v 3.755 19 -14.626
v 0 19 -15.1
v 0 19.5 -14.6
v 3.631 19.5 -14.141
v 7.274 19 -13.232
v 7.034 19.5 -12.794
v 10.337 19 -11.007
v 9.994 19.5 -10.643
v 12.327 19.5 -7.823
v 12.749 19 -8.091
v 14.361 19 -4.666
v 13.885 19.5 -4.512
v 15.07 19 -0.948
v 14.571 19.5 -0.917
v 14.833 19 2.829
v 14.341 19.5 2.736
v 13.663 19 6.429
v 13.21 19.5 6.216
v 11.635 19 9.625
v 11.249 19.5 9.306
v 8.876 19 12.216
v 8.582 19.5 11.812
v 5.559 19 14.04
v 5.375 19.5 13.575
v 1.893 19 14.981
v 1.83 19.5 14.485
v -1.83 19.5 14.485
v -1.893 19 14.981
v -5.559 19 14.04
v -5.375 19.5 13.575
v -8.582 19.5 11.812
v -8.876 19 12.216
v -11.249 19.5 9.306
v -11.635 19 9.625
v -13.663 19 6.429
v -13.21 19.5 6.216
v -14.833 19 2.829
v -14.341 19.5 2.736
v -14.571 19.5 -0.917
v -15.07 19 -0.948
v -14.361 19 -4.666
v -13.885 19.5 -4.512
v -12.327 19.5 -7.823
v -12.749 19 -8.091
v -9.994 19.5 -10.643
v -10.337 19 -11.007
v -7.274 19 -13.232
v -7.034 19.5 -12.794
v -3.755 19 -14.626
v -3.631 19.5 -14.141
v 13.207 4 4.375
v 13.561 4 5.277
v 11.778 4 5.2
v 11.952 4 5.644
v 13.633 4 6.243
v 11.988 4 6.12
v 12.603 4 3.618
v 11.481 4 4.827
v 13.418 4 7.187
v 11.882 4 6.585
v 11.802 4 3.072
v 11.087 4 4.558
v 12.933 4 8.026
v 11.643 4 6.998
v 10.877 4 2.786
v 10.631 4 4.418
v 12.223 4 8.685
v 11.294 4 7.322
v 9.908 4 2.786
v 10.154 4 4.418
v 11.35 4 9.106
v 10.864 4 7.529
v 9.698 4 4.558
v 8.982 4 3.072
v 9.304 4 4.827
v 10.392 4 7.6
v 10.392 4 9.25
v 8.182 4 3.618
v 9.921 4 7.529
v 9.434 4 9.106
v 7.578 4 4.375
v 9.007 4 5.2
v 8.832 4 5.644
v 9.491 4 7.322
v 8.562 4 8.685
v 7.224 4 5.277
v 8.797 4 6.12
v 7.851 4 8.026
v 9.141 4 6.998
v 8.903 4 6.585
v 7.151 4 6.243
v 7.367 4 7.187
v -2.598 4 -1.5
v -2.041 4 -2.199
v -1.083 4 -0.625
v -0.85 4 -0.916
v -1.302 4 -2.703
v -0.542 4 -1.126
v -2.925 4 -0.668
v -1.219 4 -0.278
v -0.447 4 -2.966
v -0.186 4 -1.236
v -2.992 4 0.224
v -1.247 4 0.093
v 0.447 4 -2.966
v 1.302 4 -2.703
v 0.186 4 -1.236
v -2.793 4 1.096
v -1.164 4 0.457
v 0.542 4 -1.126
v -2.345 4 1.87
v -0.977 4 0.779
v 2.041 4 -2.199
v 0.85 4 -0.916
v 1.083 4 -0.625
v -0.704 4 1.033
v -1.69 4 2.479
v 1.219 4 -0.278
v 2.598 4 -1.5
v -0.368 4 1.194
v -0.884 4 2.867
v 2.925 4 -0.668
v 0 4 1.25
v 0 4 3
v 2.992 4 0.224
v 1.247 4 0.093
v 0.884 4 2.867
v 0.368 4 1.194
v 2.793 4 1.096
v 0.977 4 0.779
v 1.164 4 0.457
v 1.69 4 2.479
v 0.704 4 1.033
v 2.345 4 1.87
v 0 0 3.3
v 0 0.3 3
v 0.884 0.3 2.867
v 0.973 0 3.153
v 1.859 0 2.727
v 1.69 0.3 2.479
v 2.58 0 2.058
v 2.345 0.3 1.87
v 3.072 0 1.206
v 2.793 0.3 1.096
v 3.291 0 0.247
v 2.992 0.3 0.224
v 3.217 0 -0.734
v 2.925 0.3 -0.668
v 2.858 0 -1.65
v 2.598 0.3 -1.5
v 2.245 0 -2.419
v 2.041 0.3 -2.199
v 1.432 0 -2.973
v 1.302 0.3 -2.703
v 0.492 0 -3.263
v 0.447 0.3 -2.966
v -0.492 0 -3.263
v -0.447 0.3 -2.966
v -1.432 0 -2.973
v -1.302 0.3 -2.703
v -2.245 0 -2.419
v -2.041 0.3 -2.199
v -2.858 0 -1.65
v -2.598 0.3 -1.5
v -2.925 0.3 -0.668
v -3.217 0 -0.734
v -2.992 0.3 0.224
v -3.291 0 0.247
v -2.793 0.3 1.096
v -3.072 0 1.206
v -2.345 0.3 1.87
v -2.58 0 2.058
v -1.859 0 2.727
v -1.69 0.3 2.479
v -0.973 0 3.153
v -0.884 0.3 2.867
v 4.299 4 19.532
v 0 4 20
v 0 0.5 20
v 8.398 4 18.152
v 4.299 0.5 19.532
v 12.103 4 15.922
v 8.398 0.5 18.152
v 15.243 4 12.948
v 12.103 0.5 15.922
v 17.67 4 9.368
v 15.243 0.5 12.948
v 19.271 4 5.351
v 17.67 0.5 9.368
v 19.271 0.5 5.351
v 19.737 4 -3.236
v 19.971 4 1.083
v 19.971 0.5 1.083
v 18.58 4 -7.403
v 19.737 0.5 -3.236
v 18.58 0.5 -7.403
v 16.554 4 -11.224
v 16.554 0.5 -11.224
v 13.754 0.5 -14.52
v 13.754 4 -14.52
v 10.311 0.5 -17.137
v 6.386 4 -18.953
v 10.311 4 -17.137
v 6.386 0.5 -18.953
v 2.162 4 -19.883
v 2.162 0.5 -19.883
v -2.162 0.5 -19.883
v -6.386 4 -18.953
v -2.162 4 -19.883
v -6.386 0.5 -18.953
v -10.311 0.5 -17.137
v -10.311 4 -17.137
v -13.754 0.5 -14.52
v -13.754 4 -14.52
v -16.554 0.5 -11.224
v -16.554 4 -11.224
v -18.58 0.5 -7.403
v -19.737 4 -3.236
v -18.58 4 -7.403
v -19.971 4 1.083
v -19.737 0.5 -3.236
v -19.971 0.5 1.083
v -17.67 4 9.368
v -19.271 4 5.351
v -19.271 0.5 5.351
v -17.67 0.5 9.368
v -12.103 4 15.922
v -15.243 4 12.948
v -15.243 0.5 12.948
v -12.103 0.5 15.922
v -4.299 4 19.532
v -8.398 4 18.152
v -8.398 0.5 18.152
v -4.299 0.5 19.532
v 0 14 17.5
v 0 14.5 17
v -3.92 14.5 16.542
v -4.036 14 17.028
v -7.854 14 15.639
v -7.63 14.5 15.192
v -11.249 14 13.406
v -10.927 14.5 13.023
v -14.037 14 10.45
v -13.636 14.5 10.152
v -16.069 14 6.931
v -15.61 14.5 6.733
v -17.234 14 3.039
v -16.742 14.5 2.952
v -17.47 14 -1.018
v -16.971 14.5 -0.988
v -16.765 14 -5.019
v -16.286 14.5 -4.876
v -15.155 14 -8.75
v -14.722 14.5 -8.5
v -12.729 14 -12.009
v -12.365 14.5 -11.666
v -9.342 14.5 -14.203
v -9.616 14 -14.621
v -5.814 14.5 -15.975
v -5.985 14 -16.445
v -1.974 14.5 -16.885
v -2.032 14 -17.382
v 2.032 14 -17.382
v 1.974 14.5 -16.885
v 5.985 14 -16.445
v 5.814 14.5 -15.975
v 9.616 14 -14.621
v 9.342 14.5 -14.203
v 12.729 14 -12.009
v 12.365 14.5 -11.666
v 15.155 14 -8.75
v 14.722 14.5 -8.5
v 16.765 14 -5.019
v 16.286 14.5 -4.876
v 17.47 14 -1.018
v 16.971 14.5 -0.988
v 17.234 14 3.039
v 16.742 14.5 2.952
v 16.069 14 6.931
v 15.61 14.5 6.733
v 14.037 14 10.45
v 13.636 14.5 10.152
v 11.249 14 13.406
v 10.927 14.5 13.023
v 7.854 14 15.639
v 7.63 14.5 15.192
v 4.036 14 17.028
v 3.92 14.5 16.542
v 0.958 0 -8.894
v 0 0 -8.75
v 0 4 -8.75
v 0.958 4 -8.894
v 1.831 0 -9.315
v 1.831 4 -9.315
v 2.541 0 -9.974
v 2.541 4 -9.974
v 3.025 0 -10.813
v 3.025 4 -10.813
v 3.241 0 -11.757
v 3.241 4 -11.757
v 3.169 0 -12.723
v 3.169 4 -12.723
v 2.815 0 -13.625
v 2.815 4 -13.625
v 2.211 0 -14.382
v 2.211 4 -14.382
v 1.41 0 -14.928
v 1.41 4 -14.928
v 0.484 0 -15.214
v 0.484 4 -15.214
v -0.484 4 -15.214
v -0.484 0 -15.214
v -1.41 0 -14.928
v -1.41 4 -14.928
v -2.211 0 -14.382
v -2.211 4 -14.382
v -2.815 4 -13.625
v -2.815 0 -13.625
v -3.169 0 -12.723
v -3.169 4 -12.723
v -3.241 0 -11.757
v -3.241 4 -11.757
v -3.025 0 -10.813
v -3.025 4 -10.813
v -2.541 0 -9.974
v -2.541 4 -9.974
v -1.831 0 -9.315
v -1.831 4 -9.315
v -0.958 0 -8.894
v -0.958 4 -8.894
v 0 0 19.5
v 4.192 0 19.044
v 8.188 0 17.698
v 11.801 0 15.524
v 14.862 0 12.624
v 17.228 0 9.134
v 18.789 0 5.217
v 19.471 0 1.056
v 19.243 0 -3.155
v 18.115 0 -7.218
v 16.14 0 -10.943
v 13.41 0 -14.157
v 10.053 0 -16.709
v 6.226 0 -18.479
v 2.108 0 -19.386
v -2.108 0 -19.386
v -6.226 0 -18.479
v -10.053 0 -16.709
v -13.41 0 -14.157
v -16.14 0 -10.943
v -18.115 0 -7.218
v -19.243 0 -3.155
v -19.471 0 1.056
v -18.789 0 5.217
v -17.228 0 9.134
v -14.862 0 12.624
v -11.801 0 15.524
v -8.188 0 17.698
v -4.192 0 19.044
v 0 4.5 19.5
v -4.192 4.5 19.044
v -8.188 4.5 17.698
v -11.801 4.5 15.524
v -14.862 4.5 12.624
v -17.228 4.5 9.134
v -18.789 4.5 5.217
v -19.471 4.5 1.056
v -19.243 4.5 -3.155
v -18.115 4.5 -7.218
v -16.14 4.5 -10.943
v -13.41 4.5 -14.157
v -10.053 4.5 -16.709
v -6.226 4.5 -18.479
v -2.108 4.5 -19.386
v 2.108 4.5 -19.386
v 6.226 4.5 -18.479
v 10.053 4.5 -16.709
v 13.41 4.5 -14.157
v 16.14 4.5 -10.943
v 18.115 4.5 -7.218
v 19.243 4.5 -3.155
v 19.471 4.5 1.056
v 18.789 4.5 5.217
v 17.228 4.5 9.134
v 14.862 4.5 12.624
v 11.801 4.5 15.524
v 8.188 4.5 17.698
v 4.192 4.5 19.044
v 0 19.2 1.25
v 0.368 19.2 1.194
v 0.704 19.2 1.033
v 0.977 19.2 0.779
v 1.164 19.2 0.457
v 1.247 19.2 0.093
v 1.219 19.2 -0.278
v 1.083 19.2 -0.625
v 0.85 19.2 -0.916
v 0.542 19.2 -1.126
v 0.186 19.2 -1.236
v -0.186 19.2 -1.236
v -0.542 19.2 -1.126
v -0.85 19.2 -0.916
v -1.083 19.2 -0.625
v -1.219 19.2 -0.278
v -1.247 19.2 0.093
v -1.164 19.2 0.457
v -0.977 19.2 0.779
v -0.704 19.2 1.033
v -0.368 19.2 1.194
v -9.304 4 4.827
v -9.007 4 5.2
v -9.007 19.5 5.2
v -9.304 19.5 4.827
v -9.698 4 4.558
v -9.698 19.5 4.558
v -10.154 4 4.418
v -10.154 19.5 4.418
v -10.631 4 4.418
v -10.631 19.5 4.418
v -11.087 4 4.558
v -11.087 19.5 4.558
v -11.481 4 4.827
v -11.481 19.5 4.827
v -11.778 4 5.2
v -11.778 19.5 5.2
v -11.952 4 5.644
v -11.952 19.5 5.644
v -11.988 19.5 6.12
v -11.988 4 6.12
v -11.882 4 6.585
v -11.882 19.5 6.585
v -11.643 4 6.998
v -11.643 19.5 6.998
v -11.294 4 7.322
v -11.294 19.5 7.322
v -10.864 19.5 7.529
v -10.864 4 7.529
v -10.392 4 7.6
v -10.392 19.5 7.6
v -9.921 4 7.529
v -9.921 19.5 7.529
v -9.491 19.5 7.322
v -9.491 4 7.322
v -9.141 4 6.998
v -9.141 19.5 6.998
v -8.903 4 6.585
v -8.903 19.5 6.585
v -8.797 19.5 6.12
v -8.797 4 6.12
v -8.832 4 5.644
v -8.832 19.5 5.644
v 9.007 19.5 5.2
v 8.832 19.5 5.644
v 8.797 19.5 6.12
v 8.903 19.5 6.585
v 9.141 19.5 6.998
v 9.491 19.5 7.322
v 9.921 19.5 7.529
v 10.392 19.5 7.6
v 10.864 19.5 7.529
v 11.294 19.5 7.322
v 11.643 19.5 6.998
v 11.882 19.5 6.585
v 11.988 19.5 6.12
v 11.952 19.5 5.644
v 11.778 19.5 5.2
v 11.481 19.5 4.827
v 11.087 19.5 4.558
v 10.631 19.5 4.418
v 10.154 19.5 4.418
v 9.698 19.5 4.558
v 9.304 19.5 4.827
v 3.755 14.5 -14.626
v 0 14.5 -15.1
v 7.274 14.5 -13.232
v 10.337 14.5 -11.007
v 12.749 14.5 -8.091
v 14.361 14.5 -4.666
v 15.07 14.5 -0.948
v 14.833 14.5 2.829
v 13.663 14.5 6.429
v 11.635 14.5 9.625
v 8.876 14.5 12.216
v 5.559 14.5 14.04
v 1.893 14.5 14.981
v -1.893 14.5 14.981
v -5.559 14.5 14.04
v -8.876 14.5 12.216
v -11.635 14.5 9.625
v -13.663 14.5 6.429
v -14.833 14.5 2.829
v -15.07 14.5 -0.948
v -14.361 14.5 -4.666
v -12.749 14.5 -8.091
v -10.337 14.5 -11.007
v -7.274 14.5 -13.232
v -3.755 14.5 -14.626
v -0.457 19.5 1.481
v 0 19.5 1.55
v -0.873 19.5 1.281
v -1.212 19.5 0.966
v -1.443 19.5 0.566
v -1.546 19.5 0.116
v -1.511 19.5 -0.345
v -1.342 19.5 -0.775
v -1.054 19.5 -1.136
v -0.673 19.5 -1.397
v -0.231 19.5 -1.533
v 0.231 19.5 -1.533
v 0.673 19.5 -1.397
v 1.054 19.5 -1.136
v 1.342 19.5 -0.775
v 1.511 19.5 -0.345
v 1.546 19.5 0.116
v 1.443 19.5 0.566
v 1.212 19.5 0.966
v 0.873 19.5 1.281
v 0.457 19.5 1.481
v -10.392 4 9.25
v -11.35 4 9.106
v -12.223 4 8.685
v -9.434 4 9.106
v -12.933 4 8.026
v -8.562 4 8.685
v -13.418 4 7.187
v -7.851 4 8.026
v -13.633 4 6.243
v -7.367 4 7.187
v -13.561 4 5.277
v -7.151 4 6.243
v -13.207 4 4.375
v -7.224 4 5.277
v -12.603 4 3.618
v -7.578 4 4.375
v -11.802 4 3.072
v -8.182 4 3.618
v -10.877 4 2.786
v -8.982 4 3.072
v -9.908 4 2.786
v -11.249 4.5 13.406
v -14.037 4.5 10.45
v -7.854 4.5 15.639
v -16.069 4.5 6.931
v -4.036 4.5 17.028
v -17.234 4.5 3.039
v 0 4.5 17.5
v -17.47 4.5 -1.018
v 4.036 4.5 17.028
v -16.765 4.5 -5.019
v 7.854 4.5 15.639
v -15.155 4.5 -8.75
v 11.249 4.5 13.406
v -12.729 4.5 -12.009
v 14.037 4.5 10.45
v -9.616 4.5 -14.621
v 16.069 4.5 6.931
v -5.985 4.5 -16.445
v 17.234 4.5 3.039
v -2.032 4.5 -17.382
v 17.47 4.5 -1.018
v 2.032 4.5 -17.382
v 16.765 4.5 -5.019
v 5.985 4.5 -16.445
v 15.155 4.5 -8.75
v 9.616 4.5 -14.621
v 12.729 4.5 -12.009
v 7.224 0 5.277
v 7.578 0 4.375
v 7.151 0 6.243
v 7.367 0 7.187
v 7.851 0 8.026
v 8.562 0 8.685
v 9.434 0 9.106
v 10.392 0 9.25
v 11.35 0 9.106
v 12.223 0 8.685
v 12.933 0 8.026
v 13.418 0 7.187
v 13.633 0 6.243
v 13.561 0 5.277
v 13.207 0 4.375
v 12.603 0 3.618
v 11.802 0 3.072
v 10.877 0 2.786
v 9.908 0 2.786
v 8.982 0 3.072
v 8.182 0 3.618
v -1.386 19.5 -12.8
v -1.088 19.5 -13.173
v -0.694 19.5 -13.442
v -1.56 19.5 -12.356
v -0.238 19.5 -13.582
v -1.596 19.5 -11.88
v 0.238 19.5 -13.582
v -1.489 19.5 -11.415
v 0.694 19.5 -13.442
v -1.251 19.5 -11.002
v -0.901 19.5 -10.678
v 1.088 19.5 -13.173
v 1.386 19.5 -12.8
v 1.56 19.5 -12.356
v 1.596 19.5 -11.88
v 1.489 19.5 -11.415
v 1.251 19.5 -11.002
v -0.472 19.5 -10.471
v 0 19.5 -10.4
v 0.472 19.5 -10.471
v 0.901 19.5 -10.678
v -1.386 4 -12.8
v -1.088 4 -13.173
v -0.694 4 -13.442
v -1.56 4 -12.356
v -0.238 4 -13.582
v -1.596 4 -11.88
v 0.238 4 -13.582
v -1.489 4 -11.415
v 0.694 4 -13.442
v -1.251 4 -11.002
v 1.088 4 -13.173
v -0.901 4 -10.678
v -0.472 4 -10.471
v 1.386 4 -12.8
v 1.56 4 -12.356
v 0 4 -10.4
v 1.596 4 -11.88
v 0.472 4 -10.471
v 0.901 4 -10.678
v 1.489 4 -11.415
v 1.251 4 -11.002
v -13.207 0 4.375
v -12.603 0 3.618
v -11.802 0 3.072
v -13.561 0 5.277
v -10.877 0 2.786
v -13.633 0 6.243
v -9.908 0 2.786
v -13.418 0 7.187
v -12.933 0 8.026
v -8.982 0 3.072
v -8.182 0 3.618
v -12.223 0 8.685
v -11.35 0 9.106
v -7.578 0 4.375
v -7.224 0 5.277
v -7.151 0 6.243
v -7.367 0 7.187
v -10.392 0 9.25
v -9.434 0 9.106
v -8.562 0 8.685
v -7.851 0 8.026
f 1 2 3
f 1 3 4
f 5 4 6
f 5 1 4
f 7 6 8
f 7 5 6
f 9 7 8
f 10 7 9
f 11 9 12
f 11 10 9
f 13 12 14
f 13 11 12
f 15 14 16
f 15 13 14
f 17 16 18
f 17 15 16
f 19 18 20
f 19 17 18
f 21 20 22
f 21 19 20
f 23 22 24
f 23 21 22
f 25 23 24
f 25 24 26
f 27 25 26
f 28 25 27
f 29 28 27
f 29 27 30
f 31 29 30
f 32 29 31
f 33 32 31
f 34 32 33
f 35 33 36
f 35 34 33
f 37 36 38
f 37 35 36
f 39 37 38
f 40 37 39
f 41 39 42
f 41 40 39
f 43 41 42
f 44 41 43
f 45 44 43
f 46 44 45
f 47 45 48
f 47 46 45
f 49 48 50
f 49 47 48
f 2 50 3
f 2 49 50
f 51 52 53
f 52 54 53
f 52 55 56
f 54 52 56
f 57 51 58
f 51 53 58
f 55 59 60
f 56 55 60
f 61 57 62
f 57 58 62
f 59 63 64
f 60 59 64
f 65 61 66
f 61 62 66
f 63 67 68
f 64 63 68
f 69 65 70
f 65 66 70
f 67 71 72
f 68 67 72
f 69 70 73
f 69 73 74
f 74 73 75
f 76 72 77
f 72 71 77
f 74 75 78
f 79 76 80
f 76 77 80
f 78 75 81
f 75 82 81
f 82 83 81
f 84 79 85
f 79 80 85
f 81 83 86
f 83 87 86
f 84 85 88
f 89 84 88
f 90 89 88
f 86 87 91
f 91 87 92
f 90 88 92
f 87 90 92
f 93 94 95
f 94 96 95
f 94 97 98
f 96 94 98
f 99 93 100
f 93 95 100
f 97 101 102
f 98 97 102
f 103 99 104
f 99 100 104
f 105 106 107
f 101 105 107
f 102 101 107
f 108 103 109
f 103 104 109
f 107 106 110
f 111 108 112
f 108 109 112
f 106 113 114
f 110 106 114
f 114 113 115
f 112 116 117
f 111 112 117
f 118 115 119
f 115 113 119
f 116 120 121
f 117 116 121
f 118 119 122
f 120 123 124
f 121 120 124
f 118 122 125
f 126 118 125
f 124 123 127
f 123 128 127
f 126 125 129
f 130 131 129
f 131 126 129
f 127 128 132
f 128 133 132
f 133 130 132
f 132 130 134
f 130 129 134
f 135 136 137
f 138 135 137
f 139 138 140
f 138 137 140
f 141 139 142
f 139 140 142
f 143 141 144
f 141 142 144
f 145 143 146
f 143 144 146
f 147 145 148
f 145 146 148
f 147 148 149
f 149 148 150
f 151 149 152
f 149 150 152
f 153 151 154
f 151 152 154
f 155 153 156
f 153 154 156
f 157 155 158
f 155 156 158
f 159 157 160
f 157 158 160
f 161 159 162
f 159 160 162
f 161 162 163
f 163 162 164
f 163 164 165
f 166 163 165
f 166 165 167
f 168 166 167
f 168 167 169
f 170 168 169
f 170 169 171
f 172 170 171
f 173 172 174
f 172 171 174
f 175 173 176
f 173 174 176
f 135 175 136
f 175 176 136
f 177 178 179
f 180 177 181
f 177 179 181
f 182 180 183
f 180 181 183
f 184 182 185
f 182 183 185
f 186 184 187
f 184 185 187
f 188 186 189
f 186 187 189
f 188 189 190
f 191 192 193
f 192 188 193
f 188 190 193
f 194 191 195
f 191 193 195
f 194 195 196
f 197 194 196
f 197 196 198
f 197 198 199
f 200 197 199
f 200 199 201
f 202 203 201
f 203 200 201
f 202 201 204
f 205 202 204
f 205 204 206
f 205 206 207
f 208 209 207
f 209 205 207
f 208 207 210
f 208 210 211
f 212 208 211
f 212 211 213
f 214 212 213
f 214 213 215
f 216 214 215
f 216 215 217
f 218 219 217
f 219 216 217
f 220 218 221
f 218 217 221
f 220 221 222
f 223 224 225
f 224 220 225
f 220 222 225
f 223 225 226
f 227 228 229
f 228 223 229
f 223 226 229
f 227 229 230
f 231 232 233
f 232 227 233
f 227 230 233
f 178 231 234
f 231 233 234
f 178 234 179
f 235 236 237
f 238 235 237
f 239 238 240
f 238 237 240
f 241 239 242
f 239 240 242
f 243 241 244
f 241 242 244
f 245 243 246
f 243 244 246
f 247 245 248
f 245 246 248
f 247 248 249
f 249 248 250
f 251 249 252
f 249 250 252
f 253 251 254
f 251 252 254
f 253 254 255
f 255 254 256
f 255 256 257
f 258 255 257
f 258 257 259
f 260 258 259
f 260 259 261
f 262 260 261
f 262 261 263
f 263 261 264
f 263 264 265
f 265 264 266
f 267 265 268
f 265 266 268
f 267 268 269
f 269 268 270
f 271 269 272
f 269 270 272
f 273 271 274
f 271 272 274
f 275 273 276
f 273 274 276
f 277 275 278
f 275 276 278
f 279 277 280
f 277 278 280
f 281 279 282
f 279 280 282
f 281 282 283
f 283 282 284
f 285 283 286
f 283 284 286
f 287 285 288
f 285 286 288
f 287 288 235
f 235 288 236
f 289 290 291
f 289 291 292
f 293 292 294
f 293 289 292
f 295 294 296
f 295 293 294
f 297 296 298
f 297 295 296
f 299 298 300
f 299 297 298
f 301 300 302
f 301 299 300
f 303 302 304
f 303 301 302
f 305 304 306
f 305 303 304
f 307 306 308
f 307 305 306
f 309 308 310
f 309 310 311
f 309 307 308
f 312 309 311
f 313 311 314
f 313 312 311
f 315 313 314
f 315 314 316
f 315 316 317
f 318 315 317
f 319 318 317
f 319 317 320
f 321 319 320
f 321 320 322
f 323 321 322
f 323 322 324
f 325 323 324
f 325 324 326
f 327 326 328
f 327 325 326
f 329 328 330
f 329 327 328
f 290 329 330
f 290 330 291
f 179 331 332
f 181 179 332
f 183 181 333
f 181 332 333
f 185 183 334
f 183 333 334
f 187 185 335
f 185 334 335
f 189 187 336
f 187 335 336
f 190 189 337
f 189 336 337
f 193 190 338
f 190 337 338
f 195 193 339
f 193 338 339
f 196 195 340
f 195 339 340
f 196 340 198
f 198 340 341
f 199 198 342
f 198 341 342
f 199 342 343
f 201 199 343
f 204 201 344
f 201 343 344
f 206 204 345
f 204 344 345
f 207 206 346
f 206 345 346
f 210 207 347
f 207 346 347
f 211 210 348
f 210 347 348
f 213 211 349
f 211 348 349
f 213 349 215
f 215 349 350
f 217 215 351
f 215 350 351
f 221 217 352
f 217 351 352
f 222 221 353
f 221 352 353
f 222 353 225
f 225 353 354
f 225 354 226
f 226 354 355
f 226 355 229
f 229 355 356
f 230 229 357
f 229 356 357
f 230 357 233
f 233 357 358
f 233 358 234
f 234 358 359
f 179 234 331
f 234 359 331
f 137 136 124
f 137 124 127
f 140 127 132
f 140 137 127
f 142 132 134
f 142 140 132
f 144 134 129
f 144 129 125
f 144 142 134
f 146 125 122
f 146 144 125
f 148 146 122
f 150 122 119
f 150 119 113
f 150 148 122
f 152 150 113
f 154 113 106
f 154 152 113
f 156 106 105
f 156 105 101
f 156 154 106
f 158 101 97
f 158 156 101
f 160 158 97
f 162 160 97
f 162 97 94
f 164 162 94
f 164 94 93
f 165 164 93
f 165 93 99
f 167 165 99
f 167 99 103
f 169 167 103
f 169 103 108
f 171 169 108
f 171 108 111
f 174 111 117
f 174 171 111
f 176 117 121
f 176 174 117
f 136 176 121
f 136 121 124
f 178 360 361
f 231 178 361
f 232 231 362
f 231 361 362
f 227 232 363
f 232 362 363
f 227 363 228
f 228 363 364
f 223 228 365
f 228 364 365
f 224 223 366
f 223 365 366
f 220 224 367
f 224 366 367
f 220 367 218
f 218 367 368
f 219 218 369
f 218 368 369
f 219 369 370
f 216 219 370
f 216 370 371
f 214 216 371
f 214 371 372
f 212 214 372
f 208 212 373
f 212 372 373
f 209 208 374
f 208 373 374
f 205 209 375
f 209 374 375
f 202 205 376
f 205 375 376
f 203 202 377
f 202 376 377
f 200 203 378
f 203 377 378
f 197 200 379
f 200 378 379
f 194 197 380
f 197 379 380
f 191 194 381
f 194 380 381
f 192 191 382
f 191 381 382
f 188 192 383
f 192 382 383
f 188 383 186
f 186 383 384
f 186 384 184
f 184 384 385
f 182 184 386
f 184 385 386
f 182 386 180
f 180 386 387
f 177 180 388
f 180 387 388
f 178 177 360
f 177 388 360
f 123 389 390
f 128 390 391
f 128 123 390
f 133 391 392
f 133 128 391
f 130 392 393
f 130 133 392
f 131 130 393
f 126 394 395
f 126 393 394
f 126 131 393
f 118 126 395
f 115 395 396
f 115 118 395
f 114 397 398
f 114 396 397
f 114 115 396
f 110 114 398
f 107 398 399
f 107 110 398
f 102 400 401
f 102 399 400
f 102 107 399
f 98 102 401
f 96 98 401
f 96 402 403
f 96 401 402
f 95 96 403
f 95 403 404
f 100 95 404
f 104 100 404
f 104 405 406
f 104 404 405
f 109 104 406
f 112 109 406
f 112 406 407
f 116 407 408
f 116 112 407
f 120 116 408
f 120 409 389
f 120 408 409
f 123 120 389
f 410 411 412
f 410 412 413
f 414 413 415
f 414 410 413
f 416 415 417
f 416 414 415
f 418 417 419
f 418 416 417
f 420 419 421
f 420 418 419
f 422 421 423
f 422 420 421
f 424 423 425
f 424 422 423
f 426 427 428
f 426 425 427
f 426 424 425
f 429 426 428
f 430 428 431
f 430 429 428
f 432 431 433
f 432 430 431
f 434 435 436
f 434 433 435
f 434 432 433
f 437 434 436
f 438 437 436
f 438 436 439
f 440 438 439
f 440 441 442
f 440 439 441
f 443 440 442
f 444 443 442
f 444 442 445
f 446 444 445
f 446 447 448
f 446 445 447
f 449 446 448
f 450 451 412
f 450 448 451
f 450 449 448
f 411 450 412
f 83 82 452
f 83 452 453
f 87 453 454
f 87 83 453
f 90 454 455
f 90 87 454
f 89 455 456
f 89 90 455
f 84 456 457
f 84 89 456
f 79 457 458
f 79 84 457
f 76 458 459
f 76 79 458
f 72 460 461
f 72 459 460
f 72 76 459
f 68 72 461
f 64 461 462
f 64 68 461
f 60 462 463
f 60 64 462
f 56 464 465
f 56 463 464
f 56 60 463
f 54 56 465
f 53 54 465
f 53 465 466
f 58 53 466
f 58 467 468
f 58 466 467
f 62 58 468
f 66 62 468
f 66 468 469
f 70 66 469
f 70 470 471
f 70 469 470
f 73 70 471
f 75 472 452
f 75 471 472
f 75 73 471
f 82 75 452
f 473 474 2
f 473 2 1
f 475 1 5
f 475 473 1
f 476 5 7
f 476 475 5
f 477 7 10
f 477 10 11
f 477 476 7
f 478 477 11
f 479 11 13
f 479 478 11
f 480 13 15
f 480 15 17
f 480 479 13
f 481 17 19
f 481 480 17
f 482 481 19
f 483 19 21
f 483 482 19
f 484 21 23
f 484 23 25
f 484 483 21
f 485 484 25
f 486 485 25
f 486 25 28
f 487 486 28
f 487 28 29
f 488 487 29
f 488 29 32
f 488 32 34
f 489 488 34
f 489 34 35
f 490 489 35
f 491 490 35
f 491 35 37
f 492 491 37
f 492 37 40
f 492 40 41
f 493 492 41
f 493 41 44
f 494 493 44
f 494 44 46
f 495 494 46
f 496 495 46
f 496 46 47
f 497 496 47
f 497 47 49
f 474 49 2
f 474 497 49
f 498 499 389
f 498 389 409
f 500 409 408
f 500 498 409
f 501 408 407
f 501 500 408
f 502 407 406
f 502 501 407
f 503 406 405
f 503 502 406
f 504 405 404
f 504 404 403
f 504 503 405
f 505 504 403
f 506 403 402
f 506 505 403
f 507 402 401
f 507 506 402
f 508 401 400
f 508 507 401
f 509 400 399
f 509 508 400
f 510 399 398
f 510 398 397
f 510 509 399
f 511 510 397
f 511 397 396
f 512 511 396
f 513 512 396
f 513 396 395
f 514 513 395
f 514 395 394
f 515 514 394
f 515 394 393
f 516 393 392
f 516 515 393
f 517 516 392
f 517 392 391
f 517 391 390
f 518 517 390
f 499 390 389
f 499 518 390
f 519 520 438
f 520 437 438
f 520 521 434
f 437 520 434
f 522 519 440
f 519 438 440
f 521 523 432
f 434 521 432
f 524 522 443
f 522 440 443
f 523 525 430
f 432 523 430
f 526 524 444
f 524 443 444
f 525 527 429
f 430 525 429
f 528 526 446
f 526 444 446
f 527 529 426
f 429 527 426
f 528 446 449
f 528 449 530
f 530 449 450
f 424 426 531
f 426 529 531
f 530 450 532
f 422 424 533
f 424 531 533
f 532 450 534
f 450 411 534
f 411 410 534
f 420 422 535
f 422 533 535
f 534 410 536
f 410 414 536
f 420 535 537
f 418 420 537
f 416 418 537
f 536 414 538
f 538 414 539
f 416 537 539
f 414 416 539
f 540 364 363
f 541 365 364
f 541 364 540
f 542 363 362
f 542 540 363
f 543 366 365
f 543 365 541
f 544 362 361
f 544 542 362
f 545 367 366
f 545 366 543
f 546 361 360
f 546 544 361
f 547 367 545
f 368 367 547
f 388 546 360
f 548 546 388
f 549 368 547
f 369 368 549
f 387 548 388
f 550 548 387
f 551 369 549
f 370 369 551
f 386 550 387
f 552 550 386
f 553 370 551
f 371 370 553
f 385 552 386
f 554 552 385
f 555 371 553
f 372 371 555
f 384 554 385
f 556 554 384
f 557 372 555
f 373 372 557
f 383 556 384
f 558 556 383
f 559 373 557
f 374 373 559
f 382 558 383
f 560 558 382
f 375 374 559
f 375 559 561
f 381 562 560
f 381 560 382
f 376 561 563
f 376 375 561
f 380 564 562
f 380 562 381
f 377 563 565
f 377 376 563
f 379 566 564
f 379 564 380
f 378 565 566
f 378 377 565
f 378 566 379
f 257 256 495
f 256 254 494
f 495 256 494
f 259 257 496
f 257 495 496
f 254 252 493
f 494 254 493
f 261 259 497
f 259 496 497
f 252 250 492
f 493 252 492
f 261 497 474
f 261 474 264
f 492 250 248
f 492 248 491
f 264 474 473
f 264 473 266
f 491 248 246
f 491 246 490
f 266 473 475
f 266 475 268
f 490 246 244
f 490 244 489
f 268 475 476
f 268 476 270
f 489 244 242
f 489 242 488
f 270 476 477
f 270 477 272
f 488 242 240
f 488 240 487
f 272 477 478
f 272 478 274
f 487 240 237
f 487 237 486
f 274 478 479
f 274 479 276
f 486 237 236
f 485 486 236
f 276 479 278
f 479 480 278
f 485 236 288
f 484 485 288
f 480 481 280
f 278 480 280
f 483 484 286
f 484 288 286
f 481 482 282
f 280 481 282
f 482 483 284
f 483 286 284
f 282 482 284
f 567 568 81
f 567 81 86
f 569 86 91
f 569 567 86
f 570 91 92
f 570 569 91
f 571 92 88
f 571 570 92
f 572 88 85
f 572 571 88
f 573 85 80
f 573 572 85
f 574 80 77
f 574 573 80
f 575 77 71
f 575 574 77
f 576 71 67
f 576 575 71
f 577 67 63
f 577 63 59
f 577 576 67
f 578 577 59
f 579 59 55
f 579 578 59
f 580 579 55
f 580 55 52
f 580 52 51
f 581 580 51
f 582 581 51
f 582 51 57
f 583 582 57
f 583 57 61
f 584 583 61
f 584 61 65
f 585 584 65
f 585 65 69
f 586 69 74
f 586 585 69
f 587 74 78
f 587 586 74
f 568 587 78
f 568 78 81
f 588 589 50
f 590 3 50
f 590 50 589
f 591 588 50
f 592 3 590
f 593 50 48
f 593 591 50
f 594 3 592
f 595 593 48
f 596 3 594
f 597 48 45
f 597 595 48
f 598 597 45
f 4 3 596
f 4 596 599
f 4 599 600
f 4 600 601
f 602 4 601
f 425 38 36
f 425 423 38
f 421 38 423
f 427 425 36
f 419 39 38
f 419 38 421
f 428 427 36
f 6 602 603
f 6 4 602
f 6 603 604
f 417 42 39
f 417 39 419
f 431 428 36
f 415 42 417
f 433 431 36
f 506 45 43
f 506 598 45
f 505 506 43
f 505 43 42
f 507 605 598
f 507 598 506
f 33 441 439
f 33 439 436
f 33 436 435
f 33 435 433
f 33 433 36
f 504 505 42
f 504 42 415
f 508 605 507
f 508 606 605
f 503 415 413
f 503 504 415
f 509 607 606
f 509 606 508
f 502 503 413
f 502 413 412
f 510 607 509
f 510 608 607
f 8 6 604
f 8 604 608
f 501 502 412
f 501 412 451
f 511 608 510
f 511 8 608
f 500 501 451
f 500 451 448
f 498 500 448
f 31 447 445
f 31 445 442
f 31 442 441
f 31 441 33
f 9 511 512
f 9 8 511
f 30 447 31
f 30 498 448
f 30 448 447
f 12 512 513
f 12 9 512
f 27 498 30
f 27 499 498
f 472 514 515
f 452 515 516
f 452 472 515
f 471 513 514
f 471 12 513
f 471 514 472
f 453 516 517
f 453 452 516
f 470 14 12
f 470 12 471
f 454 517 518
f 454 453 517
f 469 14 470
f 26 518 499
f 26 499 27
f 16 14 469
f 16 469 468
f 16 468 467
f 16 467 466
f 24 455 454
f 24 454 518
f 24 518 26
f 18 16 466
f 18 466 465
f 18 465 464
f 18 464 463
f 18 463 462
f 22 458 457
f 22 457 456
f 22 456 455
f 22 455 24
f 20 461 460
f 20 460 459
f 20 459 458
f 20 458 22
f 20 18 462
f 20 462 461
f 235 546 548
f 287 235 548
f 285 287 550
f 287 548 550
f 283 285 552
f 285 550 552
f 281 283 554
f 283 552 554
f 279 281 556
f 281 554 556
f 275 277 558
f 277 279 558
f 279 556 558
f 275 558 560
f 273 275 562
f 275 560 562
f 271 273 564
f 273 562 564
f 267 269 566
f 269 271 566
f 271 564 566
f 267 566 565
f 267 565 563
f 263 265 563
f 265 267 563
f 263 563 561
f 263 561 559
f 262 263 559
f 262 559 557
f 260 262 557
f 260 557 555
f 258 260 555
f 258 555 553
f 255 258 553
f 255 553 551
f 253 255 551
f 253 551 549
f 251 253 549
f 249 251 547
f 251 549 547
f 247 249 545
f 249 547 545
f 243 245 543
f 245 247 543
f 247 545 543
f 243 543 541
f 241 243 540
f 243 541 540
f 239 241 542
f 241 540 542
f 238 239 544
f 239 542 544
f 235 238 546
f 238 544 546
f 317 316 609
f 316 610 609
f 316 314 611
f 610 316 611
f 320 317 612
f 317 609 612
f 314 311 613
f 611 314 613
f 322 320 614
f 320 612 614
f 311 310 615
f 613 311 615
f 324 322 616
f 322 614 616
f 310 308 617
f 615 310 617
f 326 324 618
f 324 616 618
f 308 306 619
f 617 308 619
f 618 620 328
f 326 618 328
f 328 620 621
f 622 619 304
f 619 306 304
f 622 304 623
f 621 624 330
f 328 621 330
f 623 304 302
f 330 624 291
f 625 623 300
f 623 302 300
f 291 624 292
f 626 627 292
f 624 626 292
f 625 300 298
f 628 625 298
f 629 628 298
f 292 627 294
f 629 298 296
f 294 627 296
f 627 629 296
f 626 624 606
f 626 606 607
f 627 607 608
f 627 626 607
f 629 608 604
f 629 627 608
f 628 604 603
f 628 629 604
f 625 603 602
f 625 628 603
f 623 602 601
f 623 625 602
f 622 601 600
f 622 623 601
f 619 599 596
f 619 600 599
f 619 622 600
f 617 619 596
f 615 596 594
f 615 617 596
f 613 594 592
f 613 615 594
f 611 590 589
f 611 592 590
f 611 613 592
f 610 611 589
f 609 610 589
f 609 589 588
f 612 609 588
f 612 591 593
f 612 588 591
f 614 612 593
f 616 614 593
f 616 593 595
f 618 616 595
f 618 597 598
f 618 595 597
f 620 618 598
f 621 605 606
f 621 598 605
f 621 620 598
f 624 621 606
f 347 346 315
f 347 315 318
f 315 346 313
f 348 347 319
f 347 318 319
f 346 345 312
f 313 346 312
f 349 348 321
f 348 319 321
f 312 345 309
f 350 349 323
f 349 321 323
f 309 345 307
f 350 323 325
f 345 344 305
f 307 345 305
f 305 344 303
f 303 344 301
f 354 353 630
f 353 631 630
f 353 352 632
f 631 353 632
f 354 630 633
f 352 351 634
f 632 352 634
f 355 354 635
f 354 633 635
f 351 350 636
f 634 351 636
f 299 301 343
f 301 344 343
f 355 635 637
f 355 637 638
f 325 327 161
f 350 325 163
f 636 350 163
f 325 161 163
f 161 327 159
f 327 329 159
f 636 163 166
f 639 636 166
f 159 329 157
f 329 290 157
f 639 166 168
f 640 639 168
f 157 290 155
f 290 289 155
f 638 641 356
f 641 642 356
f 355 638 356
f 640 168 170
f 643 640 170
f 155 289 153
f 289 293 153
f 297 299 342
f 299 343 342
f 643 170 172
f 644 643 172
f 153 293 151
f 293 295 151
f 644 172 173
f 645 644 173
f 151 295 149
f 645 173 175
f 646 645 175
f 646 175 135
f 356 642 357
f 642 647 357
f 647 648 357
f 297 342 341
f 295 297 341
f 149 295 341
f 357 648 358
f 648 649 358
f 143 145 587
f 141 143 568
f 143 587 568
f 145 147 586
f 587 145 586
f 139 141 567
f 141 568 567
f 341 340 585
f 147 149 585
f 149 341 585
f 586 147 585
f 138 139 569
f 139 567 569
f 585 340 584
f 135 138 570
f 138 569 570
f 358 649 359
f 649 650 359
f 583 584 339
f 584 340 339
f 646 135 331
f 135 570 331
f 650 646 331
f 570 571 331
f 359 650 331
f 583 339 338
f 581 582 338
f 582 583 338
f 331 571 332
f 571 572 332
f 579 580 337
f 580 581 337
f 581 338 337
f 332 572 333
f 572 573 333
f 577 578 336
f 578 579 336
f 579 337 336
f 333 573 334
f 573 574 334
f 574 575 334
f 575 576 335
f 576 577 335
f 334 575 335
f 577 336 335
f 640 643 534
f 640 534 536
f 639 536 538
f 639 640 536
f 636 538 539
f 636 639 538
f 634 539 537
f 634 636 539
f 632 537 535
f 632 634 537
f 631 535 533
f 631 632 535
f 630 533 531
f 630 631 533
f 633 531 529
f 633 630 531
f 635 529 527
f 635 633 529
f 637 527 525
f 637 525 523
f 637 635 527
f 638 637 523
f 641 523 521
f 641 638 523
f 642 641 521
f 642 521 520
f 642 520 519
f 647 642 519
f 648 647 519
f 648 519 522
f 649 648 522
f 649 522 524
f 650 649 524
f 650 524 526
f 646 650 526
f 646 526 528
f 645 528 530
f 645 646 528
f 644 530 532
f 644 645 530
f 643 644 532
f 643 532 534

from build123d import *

# Parameters (mm, degrees)
SKETCH_1_R               = 20
EXTRUDE_1_DEPTH          = 19.5
CUT_EXTRUDE_START        = 4.5
SKETCH_2_OUTSIDE_W       = 53.968
SKETCH_2_OUTSIDE_H       = 53.968
SKETCH_2_OUTSIDE_R       = 17.5
CUT_EXTRUDE_1_DEPTH      = 30.854766773
CUT_EXTRUDE_START_2      = -14.5
SKETCH_3_OUTSIDE_W       = 53.968
SKETCH_3_OUTSIDE_H       = 53.968
SKETCH_3_OUTSIDE_R       = 15.1
CUT_EXTRUDE_2_DEPTH      = 6
SKETCH_4_R               = 1.25
CUT_EXTRUDE_3_DEPTH      = 35.354766773
SKETCH_4_3_R             = 1.6
CUT_EXTRUDE_4_DEPTH      = 35.354766773
SKETCH_4_4_R             = 3.25
SKETCH_4_4_R_2           = 1.6
CUT_EXTRUDE_5_DEPTH      = 4
PATTERN_CIRCULAR_1_COUNT = 3
CHAMFER_1_SIZE           = 0.5
SKETCH_4_5_R             = 3
SKETCH_4_5_R_2           = 1.25
CUT_EXTRUDE_6_DEPTH      = 4
CHAMFER_2_SIZE           = 0.3


with BuildPart() as part:
    # Эскиз1 → Бобышка-Вытянуть1 (new body)
    with BuildSketch(Plane(origin=(0, 0, 0), x_dir=(1, 0, 0), z_dir=(0, 1, 0))):
        Circle(SKETCH_1_R)
    extrude(amount=EXTRUDE_1_DEPTH)

    # Эскиз2 outside → Вырез-Вытянуть1 (cut, through all)
    with BuildSketch(Plane(origin=(0, 0, 0), x_dir=(1, 0, 0), z_dir=(0, 1, 0)).offset(CUT_EXTRUDE_START)):
        Rectangle(SKETCH_2_OUTSIDE_W, SKETCH_2_OUTSIDE_H)
        Circle(SKETCH_2_OUTSIDE_R, mode=Mode.SUBTRACT)
    extrude(amount=CUT_EXTRUDE_1_DEPTH, mode=Mode.SUBTRACT)

    # Эскиз3 outside → Вырез-Вытянуть2 (cut)
    with BuildSketch(Plane.XZ.offset(CUT_EXTRUDE_START_2)):
        Rectangle(SKETCH_3_OUTSIDE_W, SKETCH_3_OUTSIDE_H)
        Circle(SKETCH_3_OUTSIDE_R, mode=Mode.SUBTRACT)
    extrude(amount=-CUT_EXTRUDE_2_DEPTH, mode=Mode.SUBTRACT)

    # Эскиз4 → Вырез-Вытянуть3 (cut, through all)
    with BuildSketch(Plane(origin=(0, 0, 0), x_dir=(1, 0, 0), z_dir=(0, 1, 0))):
        Circle(SKETCH_4_R)
    extrude(amount=CUT_EXTRUDE_3_DEPTH, mode=Mode.SUBTRACT)

    # Эскиз4<3> → Вырез-Вытянуть4 (cut, through all)
    with BuildSketch(Plane(origin=(0, 0, 0), x_dir=(1, 0, 0), z_dir=(0, 1, 0))):
        with Locations((0, 12)):
            Circle(SKETCH_4_3_R)
    cut_extrude_4 = extrude(amount=CUT_EXTRUDE_4_DEPTH, mode=Mode.SUBTRACT)

    # Эскиз4<4> → Вырез-Вытянуть5 (cut)
    with BuildSketch(Plane(origin=(0, 0, 0), x_dir=(1, 0, 0), z_dir=(0, 1, 0))):
        with Locations((0, 12)):
            Circle(SKETCH_4_4_R)
        with Locations((0, 12)):
            Circle(SKETCH_4_4_R_2, mode=Mode.SUBTRACT)
    cut_extrude_5 = extrude(amount=CUT_EXTRUDE_5_DEPTH, mode=Mode.SUBTRACT)

    # Круговой массив1: Вырез-Вытянуть4, Вырез-Вытянуть5 ×3 about axis
    pattern_circular_1_axis = Axis((0, 19.5, 0), (0, -1, 0))
    add([cut_extrude_4.rotate(pattern_circular_1_axis, i * 360 / PATTERN_CIRCULAR_1_COUNT) for i in range(1, PATTERN_CIRCULAR_1_COUNT)], mode=Mode.SUBTRACT)
    add([cut_extrude_5.rotate(pattern_circular_1_axis, i * 360 / PATTERN_CIRCULAR_1_COUNT) for i in range(1, PATTERN_CIRCULAR_1_COUNT)], mode=Mode.SUBTRACT)

    # Фаска1
    chamfer_1_edges = [part.edges().sort_by_distance(p)[0] for p in [
        (-20, 4.5, 0),
        (-20, 0, 0),
        (-15.1, 19.5, 0),
        (-17.5, 14.5, 0),
    ]]
    chamfer(chamfer_1_edges, length=CHAMFER_1_SIZE)

    # Эскиз4<5> → Вырез-Вытянуть6 (cut)
    with BuildSketch(Plane(origin=(0, 0, 0), x_dir=(1, 0, 0), z_dir=(0, 1, 0))):
        Circle(SKETCH_4_5_R)
        Circle(SKETCH_4_5_R_2, mode=Mode.SUBTRACT)
    extrude(amount=CUT_EXTRUDE_6_DEPTH, mode=Mode.SUBTRACT)

    # Фаска2
    chamfer_2_edges = [part.edges().sort_by_distance(p)[0] for p in [
        (-1.25, 19.5, 0),
        (-3, 0, 0),
    ]]
    chamfer(chamfer_2_edges, length=CHAMFER_2_SIZE)


solid = part.part
